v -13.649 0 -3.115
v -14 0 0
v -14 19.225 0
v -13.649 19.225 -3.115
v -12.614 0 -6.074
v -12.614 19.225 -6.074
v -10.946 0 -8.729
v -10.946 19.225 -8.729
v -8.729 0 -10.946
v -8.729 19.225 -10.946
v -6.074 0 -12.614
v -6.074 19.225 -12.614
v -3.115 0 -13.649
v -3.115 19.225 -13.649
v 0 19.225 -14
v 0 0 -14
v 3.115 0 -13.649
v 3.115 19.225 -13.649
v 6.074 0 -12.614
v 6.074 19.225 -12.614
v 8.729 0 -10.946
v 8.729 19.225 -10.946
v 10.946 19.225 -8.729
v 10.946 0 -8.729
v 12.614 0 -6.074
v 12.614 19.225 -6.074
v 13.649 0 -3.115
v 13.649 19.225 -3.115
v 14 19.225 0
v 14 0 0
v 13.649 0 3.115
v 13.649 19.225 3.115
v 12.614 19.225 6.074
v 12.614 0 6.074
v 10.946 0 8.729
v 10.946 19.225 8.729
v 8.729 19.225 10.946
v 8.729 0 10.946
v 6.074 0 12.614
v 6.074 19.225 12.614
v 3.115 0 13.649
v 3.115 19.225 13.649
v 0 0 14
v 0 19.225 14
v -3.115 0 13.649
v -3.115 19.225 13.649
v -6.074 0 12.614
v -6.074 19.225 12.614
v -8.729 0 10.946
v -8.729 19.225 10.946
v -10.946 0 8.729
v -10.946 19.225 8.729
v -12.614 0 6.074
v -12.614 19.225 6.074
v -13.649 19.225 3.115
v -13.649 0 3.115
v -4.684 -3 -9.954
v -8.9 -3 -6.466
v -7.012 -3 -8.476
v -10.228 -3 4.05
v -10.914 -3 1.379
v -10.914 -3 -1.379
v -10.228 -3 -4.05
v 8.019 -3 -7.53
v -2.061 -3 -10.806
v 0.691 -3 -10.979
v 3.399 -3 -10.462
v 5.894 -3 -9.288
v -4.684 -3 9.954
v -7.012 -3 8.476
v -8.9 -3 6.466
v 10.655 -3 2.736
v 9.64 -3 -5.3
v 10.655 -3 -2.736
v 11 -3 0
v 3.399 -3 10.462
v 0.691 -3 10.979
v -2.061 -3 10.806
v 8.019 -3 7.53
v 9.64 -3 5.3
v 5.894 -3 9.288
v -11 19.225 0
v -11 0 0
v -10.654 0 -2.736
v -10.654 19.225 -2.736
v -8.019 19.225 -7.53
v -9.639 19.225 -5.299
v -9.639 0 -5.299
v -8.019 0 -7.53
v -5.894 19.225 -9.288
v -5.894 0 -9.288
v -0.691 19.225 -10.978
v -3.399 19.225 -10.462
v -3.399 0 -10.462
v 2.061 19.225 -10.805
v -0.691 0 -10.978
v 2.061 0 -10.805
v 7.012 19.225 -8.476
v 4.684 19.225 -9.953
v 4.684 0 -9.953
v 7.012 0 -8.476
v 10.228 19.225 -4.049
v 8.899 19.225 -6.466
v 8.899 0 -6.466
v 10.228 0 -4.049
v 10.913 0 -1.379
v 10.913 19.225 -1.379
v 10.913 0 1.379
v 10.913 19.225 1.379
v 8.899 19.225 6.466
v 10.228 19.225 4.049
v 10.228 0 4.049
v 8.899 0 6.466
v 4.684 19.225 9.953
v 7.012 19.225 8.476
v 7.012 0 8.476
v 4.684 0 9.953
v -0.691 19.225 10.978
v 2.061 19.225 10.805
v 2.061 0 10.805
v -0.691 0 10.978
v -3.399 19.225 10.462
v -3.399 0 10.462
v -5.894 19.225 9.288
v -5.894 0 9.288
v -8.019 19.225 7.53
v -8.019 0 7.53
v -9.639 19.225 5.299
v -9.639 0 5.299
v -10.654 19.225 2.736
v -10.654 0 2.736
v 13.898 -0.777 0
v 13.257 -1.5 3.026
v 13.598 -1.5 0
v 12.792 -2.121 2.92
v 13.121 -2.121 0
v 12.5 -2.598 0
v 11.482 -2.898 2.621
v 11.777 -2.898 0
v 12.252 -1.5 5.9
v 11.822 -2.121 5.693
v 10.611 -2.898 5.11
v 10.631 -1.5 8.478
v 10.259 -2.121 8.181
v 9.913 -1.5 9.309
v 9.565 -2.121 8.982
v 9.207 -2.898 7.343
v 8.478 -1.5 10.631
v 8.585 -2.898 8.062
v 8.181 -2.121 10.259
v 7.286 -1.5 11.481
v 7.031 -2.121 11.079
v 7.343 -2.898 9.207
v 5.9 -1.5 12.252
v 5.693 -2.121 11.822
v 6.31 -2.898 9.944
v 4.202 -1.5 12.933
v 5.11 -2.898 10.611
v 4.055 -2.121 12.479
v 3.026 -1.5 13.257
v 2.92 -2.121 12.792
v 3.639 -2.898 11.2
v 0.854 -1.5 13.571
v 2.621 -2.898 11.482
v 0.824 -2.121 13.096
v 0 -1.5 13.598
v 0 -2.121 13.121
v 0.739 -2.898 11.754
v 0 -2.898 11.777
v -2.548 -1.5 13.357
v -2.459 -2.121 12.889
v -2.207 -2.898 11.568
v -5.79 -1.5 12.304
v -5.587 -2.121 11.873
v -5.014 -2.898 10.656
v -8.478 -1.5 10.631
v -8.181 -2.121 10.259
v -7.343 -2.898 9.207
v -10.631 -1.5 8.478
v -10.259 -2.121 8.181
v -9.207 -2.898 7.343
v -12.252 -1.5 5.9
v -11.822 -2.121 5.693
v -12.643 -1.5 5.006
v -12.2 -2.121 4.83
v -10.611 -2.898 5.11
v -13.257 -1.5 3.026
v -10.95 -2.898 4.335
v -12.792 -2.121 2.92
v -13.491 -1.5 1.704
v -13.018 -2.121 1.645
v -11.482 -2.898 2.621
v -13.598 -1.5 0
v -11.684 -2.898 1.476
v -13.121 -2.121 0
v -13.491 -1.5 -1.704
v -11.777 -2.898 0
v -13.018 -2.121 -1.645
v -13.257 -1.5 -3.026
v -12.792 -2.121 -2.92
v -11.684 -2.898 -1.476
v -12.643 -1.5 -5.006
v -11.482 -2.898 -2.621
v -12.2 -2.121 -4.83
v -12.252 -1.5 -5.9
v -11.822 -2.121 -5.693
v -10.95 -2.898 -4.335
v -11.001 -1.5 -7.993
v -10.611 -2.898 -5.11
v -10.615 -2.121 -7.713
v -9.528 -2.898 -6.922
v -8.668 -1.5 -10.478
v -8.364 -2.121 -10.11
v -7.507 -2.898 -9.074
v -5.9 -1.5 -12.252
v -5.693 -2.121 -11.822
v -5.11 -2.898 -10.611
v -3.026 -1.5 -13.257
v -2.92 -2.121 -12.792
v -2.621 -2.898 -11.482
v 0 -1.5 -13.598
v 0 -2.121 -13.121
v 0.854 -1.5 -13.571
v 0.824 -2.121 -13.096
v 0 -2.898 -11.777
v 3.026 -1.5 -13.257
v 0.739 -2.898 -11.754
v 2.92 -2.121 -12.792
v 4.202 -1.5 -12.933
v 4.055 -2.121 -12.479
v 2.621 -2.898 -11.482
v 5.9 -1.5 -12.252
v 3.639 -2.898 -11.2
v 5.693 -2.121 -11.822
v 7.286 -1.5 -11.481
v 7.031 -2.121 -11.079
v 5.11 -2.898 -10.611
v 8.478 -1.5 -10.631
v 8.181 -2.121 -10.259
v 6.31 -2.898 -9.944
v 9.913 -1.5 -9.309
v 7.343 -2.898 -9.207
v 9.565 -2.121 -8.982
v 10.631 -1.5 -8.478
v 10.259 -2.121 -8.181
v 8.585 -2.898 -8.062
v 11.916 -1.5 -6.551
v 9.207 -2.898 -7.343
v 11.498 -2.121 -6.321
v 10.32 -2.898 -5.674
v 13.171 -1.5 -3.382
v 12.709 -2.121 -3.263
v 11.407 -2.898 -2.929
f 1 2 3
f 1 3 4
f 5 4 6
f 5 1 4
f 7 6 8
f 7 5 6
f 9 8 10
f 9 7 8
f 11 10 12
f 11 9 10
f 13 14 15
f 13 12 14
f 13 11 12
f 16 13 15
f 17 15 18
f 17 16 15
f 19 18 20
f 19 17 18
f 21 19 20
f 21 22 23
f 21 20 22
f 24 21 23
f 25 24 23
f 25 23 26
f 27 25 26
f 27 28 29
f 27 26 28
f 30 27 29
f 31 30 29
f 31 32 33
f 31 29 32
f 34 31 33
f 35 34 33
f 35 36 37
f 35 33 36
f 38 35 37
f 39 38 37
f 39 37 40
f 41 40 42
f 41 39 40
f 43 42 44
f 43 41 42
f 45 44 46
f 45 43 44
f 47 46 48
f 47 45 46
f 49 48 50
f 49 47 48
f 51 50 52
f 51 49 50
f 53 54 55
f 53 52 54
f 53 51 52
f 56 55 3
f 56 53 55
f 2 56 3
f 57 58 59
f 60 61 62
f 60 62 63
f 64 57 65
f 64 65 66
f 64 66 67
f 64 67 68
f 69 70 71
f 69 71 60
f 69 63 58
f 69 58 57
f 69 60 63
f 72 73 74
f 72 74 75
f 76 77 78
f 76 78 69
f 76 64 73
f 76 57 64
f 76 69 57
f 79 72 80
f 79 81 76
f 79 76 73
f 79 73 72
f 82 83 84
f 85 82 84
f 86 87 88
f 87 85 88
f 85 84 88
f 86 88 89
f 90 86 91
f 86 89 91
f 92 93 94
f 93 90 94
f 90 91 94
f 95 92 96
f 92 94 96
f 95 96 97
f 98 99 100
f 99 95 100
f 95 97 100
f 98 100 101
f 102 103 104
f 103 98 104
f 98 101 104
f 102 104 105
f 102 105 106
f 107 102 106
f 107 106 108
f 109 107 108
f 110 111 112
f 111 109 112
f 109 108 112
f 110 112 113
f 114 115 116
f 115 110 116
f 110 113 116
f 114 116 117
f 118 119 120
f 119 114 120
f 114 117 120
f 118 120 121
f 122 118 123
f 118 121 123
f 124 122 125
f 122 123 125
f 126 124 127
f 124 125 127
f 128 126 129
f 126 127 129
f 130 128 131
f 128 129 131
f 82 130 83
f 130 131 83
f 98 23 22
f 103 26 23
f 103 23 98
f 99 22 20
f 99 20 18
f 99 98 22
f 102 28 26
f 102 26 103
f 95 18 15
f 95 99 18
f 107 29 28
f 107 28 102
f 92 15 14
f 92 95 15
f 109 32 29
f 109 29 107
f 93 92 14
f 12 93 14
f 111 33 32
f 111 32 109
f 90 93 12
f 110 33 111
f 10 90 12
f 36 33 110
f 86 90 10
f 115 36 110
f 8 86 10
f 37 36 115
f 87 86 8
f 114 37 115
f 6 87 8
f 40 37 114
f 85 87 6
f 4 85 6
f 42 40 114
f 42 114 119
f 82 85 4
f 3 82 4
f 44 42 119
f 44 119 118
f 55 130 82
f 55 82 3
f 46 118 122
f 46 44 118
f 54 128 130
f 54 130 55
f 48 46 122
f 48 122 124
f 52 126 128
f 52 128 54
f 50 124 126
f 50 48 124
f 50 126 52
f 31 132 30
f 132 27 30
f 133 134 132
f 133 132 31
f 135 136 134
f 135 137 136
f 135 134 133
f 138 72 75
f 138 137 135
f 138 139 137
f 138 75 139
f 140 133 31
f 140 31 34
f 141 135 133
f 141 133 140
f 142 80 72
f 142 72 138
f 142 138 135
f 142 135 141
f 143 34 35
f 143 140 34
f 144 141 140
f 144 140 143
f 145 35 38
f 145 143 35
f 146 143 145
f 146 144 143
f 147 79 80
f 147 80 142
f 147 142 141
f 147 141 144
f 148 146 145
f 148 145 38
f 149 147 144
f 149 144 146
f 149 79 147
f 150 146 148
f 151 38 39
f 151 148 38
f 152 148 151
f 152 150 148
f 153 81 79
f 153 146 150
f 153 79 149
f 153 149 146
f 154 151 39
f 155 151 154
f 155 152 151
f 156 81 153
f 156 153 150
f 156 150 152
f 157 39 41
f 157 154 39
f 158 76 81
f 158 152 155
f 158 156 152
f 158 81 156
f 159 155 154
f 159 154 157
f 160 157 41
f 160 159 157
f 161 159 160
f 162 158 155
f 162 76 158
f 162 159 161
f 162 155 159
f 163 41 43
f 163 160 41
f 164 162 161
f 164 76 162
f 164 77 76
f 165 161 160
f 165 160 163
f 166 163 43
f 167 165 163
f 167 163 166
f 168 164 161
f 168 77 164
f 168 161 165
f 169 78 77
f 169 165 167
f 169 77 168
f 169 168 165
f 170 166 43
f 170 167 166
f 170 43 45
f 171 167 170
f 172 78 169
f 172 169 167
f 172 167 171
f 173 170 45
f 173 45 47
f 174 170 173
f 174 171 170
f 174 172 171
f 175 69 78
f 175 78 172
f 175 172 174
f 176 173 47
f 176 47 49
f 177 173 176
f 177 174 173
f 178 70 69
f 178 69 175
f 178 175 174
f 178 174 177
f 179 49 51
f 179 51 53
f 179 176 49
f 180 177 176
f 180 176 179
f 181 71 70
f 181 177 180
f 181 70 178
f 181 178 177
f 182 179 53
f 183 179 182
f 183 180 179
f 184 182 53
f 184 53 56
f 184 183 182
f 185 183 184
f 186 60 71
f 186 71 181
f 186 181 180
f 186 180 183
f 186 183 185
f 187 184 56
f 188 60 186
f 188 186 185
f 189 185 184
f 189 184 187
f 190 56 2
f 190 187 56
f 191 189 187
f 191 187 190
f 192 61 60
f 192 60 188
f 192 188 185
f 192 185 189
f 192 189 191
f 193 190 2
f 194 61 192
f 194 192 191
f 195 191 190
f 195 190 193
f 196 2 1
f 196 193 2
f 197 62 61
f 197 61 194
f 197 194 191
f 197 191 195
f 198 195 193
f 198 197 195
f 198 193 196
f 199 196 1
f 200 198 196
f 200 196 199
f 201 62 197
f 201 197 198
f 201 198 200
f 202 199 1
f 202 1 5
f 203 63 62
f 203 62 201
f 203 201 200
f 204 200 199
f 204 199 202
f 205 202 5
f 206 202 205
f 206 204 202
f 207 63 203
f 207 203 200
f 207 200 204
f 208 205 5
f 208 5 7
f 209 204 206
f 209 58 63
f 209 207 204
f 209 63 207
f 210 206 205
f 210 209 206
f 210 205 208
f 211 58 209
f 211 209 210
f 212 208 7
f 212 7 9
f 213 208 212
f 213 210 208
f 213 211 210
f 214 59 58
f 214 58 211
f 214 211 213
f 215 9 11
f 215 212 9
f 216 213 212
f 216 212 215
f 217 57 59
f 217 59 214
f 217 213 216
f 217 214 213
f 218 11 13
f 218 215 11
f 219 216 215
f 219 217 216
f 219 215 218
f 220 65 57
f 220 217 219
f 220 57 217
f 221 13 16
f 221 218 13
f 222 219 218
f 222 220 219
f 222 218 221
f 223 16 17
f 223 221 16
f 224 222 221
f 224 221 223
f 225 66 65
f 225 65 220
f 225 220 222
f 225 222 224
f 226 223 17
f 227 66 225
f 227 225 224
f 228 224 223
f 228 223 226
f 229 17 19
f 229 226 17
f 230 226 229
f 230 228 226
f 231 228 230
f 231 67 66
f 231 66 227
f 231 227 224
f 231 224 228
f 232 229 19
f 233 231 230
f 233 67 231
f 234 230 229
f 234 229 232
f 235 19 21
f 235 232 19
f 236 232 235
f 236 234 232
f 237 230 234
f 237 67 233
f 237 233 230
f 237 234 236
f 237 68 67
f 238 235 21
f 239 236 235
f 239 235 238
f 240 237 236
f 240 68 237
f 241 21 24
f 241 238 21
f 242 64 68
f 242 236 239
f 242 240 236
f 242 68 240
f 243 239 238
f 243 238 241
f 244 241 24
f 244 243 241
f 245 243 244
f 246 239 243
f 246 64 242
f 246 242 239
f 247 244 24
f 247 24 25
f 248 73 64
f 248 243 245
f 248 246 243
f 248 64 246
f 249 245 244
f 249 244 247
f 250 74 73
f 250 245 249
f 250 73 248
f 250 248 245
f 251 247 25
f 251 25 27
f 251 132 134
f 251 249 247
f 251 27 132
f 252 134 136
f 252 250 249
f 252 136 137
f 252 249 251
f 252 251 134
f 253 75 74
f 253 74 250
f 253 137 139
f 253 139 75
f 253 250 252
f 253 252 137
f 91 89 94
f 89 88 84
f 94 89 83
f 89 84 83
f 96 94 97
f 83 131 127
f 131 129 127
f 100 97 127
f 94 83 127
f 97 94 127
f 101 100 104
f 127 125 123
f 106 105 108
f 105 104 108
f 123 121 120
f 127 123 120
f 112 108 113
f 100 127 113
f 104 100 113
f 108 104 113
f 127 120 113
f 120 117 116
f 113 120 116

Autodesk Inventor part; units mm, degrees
ref_plane "YZ Plane" through (0, 0, 0) normal (1, 0, 0) x (0, 1, 0)
ref_plane "XZ Plane" through (0, 0, 0) normal (0, 1, 0) x (-1, 0, 0)
ref_plane "XY Plane" through (0, 0, 0) normal (0, 0, 1) x (1, 0, 0)
sketch "Sketch5" plane through (0, 0, 0) normal (0, 1, 0) x (-1, 0, 0)
  circle A0 centre (0, 0) radius 11
  circle A1 centre (0, 0) radius 14
  dimension "d11" = 22
  dimension "d12" = 3
extrude "Extrusion4" add sketch "Sketch5" along normal blind 19.225
sketch "Sketch6" plane through (0, 0, 0) normal (0, -1, 0) x (1, 0, 0)
  circle A0 centre (0, 0) radius 14
extrude "Extrusion5" add sketch "Sketch6" along normal blind 3
fillet "Fillet2" radius 3 1 edges at (-14, -3, 0)
properties part number "Cap"
